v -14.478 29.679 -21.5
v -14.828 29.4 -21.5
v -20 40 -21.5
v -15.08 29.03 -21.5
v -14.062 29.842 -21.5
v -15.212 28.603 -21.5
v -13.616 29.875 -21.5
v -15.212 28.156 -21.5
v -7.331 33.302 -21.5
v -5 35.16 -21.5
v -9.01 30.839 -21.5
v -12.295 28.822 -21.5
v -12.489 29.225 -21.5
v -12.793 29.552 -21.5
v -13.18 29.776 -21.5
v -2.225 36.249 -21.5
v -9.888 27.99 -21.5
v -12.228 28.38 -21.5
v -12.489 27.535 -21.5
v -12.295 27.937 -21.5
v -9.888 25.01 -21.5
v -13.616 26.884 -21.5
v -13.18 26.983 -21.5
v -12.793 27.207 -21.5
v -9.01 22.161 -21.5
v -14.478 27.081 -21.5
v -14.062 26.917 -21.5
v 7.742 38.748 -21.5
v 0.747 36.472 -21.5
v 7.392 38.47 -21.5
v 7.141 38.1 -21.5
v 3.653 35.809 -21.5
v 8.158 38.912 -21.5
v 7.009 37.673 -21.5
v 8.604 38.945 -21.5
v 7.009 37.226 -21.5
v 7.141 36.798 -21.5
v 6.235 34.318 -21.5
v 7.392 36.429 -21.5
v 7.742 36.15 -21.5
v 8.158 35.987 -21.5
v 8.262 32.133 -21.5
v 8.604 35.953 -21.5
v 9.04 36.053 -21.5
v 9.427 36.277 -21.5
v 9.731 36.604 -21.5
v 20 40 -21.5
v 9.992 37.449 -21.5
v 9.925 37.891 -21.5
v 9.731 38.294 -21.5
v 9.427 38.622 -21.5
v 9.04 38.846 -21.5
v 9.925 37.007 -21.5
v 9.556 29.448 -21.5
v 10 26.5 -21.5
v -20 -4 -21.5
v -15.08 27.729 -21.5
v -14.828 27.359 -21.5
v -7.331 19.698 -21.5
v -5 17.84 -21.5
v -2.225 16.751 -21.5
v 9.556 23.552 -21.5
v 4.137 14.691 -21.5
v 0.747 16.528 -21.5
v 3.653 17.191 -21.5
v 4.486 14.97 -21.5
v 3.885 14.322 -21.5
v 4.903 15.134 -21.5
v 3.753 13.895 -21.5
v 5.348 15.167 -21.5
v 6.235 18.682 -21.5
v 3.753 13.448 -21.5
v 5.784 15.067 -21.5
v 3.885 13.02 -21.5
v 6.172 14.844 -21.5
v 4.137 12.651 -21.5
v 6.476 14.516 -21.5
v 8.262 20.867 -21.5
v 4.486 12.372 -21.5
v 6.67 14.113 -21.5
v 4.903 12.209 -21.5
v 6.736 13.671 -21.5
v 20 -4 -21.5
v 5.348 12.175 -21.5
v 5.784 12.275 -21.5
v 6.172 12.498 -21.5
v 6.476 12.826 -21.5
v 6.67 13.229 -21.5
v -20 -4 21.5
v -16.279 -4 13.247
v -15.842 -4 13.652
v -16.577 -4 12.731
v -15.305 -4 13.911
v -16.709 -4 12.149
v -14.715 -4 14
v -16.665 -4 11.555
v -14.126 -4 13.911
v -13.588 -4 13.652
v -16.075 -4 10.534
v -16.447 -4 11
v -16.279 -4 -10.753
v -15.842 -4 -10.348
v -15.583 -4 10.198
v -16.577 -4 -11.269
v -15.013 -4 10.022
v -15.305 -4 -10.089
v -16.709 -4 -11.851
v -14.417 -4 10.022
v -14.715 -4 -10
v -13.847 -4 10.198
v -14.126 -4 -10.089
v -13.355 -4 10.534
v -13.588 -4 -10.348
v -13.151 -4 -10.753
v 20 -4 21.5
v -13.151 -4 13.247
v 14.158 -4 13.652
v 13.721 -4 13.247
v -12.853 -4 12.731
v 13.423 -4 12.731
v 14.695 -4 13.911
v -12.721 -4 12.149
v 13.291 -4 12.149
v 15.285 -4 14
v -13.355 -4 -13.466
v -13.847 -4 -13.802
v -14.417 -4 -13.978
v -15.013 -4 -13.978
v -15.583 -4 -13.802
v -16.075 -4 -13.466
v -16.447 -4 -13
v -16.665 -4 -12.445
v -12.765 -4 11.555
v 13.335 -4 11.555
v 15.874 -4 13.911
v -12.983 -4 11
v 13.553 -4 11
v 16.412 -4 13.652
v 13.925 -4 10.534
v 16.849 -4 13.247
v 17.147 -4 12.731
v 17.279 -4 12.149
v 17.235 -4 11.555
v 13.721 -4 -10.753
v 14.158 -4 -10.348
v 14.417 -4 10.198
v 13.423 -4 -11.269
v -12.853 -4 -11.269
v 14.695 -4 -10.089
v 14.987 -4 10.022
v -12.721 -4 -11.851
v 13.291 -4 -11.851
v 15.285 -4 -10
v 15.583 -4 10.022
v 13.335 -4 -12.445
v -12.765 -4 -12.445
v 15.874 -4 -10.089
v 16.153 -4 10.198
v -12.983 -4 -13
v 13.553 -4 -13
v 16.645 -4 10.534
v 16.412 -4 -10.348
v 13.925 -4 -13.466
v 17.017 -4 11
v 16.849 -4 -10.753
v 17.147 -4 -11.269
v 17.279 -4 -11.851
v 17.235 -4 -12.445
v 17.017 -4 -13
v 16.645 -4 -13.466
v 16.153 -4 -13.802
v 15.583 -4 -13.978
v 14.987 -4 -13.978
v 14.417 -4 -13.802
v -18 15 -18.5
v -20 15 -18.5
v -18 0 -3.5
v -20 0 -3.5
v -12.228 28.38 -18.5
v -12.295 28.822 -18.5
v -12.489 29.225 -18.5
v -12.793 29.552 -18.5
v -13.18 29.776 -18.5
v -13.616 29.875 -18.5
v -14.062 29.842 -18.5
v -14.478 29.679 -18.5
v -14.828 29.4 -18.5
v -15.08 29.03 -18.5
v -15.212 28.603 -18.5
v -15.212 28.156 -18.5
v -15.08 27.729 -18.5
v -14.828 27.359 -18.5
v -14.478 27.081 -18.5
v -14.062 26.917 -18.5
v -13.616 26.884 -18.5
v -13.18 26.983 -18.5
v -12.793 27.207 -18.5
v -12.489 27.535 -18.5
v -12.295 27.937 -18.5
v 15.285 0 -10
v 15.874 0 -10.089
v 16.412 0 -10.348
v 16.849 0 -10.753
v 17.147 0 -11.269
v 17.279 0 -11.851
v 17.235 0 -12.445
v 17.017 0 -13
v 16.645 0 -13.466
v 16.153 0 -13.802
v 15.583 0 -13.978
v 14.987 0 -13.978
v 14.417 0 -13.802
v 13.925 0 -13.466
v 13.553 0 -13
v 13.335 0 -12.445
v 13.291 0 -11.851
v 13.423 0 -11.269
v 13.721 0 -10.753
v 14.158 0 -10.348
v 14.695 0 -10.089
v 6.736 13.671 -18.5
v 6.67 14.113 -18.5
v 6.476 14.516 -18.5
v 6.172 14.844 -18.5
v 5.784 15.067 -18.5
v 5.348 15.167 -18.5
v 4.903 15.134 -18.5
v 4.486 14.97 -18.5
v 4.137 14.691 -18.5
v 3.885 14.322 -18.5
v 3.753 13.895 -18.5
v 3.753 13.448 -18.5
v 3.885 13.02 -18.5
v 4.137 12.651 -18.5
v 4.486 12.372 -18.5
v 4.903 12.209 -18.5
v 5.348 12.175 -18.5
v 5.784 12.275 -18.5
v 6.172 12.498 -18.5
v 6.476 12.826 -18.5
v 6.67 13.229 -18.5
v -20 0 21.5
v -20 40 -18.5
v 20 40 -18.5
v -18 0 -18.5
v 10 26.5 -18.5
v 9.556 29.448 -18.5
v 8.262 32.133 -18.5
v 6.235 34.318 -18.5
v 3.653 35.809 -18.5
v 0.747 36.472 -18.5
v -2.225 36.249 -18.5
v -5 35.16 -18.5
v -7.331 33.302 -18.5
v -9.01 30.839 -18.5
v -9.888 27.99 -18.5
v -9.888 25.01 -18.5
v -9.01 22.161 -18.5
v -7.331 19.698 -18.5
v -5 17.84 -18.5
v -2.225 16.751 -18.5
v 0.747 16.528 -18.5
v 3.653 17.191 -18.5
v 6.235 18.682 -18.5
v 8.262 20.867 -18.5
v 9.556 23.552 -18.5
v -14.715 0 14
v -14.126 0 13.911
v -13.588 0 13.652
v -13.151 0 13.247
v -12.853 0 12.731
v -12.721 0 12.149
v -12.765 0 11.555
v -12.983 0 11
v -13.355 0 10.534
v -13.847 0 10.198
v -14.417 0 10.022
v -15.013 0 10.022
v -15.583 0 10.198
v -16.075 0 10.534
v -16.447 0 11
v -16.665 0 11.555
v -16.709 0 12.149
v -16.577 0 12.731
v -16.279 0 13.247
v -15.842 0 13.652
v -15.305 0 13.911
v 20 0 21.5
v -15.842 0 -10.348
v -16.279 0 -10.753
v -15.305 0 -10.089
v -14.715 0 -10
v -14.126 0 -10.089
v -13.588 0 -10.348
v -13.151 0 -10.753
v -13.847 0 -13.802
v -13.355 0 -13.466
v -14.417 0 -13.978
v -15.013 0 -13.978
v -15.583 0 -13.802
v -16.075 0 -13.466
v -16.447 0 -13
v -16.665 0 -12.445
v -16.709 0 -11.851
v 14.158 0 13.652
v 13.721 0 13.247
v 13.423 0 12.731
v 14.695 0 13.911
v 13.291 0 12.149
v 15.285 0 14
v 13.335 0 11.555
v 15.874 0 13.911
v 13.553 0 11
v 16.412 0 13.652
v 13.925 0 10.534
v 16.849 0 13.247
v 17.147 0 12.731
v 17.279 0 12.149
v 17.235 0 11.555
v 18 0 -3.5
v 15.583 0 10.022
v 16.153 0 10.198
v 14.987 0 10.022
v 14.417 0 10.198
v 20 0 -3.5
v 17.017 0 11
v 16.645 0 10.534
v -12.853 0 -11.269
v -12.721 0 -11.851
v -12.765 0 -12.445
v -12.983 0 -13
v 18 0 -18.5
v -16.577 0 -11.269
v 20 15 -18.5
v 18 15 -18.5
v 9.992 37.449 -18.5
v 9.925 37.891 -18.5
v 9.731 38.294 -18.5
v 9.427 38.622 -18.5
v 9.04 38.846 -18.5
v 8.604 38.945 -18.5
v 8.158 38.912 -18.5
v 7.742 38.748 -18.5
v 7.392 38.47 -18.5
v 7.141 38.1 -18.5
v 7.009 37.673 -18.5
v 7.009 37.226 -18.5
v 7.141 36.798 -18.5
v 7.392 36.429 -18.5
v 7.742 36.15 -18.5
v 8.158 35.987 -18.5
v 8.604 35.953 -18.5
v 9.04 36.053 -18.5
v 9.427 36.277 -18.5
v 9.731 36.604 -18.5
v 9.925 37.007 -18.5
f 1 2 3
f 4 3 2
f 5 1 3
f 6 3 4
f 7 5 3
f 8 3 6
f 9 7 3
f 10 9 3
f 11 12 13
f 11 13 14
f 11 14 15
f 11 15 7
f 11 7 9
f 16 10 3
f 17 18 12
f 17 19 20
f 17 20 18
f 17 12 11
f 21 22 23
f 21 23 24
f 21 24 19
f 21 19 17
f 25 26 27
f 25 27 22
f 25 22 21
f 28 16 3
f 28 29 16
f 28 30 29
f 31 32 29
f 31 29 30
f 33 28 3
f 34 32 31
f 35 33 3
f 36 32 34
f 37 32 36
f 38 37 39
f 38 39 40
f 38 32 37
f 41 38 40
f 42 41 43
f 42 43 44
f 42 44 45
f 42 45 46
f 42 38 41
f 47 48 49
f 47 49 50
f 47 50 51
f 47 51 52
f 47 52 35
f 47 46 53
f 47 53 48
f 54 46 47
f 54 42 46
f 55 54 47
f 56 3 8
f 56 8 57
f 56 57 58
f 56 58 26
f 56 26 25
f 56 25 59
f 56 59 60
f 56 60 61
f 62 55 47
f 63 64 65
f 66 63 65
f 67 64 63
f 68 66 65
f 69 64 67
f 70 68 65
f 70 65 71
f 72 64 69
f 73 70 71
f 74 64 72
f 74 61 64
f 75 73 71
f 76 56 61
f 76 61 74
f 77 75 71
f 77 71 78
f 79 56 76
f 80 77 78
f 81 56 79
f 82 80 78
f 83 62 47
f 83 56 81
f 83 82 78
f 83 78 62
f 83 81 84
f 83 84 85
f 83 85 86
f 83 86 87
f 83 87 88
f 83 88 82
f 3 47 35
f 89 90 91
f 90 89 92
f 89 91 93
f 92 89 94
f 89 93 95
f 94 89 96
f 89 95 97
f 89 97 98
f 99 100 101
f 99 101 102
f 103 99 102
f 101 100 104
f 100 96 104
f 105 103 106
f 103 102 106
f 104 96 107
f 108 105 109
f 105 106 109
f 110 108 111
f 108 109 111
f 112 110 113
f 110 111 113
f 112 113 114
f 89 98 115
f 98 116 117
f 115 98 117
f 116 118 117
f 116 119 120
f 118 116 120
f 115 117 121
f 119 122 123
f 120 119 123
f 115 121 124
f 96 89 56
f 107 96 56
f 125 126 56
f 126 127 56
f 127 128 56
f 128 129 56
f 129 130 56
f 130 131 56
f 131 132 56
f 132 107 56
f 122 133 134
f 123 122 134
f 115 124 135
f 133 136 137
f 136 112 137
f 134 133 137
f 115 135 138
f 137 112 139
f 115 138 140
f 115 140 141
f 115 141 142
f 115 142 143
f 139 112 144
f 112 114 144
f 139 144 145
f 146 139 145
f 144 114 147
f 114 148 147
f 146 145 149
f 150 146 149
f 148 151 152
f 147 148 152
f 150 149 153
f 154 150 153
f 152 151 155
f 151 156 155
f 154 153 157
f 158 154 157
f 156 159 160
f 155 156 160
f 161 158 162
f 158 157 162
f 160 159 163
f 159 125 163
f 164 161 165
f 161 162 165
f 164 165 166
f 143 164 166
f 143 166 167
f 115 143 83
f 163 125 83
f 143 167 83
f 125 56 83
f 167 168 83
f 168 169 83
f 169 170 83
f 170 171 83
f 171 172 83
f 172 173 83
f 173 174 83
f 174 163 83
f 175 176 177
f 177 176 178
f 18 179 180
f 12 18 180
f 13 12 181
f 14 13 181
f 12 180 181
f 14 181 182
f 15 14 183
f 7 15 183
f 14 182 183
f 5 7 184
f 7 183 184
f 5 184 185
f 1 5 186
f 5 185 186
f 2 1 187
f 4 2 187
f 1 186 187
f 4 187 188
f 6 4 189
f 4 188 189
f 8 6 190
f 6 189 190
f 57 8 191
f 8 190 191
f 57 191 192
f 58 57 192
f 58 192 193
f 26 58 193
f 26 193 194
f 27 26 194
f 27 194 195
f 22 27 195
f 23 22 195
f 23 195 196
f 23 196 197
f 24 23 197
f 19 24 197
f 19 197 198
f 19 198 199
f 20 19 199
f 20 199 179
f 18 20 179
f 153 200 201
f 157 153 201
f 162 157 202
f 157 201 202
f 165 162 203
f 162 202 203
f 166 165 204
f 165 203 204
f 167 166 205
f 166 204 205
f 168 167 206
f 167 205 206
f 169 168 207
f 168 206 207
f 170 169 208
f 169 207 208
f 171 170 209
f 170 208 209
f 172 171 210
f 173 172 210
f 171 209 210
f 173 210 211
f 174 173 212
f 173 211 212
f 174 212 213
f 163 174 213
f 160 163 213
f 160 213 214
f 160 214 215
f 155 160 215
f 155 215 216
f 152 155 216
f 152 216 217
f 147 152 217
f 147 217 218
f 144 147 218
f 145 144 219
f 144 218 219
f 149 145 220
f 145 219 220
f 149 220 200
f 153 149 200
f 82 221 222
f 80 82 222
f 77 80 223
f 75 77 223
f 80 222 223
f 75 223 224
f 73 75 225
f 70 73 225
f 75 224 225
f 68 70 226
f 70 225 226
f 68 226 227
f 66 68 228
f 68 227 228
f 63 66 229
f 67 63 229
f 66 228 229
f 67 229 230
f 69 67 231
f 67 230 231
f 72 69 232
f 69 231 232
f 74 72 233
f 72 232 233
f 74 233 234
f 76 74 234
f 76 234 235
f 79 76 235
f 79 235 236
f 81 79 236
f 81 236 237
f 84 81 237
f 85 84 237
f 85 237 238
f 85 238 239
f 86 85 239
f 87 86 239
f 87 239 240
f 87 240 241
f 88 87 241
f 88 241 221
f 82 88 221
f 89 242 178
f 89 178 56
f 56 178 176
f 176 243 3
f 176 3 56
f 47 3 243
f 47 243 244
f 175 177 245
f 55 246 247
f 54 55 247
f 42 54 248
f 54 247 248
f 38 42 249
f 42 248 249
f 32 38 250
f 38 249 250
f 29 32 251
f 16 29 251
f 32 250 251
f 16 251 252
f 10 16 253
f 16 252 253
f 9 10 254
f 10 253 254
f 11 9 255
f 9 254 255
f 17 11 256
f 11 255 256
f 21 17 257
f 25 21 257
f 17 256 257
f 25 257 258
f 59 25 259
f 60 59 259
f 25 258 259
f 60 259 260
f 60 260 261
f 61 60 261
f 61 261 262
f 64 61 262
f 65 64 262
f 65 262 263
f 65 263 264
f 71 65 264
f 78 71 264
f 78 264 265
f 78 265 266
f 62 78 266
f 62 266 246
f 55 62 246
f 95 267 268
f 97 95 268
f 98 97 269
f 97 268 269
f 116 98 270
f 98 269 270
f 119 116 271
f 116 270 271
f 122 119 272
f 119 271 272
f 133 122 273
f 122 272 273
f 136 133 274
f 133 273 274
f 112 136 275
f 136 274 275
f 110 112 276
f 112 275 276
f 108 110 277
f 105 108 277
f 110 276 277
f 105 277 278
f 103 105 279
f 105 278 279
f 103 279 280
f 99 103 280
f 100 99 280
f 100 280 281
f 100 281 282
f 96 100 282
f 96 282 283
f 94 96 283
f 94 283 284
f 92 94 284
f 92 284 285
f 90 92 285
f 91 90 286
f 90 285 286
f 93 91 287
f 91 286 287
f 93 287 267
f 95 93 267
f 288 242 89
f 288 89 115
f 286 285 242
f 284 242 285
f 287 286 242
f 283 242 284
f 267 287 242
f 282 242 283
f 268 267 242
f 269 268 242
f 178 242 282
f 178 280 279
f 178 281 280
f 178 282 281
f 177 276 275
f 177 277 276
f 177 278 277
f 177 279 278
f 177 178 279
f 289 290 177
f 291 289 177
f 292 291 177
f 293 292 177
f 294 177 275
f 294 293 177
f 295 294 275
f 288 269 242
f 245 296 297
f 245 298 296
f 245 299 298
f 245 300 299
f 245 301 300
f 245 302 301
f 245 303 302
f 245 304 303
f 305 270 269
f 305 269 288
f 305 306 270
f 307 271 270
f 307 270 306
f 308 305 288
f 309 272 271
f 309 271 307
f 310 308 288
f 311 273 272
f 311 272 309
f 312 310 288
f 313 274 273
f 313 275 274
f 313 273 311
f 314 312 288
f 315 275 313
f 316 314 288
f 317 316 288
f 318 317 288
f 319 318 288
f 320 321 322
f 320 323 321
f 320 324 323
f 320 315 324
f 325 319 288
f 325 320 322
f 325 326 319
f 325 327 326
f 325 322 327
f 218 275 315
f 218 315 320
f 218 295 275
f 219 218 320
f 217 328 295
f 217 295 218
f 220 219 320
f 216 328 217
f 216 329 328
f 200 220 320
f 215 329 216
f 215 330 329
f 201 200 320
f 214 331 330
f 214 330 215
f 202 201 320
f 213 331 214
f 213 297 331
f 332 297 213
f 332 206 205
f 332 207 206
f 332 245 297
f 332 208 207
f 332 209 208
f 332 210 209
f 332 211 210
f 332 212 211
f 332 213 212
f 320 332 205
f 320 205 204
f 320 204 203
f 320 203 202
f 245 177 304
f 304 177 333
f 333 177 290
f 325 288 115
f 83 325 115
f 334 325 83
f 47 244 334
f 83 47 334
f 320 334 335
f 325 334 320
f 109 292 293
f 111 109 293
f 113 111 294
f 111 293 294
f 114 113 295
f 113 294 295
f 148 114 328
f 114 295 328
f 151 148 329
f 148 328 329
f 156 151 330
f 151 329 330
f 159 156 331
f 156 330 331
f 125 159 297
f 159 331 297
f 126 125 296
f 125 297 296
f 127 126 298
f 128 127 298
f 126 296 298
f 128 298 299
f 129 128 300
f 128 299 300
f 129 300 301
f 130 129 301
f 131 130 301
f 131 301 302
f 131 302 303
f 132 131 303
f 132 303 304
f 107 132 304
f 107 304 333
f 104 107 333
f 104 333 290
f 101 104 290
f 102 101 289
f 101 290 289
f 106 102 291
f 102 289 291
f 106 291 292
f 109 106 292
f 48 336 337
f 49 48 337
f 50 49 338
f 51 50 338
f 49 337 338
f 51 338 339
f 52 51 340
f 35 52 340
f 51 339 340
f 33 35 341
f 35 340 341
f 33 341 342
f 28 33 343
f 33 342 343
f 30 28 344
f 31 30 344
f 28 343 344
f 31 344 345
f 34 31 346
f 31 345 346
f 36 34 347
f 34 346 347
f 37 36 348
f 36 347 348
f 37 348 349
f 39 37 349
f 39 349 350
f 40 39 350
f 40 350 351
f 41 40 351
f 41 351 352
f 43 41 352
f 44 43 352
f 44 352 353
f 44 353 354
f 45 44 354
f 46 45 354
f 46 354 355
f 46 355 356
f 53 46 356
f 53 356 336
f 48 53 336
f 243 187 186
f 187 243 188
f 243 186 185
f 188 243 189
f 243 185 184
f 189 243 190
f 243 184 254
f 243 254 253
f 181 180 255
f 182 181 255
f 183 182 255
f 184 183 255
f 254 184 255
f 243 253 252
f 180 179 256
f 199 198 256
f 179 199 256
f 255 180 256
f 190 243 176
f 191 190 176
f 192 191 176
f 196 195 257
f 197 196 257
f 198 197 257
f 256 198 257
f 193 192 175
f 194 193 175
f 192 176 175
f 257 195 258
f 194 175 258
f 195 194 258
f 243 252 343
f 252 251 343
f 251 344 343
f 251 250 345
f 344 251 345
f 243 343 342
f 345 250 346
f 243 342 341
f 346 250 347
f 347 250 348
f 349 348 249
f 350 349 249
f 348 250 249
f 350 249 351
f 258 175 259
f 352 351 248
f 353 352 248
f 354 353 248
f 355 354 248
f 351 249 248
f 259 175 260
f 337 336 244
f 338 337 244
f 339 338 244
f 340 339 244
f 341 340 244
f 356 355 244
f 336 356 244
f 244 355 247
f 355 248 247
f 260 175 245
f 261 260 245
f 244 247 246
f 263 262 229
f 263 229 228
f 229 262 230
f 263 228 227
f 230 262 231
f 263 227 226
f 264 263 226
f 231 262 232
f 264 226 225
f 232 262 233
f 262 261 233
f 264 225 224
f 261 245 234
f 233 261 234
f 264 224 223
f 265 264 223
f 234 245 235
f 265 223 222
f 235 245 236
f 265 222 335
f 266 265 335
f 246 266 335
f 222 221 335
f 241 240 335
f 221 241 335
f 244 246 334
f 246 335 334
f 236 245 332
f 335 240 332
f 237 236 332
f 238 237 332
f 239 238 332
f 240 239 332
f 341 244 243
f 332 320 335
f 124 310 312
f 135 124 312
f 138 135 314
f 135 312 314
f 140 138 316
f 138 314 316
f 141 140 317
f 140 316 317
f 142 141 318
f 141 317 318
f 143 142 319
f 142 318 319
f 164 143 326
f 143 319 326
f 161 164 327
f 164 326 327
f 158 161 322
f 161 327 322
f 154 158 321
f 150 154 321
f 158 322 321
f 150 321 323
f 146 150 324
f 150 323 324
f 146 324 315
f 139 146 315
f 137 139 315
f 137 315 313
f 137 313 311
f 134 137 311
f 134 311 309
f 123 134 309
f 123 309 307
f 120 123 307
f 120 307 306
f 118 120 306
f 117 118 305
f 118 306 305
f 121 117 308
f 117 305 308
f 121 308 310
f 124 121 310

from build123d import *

# Parameters (mm, degrees)
SKETCH1_W           = 40
SKETCH1_H           = 43
SKETCH1_R           = 2
BOSS_EXTRUDE1_DEPTH = 4
SKETCH4_W           = 40
SKETCH4_H           = 3
BOSS_EXTRUDE2_DEPTH = 40
SKETCH5_R           = 1.5
SKETCH5_R_2         = 10
CUT_EXTRUDE1_DEPTH  = 24
BOSS_EXTRUDE3_DEPTH = 2
BOSS_EXTRUDE4_DEPTH = 2


with BuildPart() as part:
    # Sketch1 → Boss-Extrude1 (new body)
    with BuildSketch(Plane(origin=(0, 0, 0), x_dir=(1, 0, 0), z_dir=(0, 1, 0))):
        Rectangle(SKETCH1_W, SKETCH1_H)
        with Locations(Location((-14.715053003, 12, 0), (0, 0, 270))):
            Circle(SKETCH1_R, mode=Mode.SUBTRACT)
        with Locations(Location((15.284946997, 12, 0), (0, 0, 270))):
            Circle(SKETCH1_R, mode=Mode.SUBTRACT)
        with Locations(Location((-14.715053003, -12, 0), (0, 0, 270))):
            Circle(SKETCH1_R, mode=Mode.SUBTRACT)
        with Locations(Location((15.284946997, -12, 0), (0, 0, 270))):
            Circle(SKETCH1_R, mode=Mode.SUBTRACT)
    extrude(amount=-BOSS_EXTRUDE1_DEPTH)

    # Sketch4 → Boss-Extrude2 (add)
    with BuildSketch(Plane(origin=(0, 0, 0), x_dir=(1, 0, 0), z_dir=(0, 1, 0))):
        with Locations((0, 20)):
            Rectangle(SKETCH4_W, SKETCH4_H)
    extrude(amount=BOSS_EXTRUDE2_DEPTH)

    # Sketch5 → Cut-Extrude1 (cut)
    with BuildSketch(Plane.XY.offset(-18.5)):
        with Locations((8.491960292, 37.449274423)):
            Circle(SKETCH5_R)
        with Locations((-13.72832995, 28.379616129)):
            Circle(SKETCH5_R)
        with Locations((5.236369657, 13.671109447)):
            Circle(SKETCH5_R)
        with Locations((0, 26.5)):
            Circle(SKETCH5_R_2)
    extrude(amount=-CUT_EXTRUDE1_DEPTH, mode=Mode.SUBTRACT)

    # Sketch6 → Boss-Extrude3 (add)
    with BuildSketch(Plane(origin=(20, 0, 0), x_dir=(0, 0, -1), z_dir=(1, 0, 0))):
        Polygon((18.5, 15), (3.5, 0), (18.5, 0), align=None)
    extrude(amount=-BOSS_EXTRUDE3_DEPTH)

    # Sketch7 → Boss-Extrude4 (add)
    with BuildSketch(Plane.ZY.offset(20)):
        Polygon((-18.5, 15), (-3.5, 0), (-18.5, 0), align=None)
    extrude(amount=-BOSS_EXTRUDE4_DEPTH)


solid = part.part
